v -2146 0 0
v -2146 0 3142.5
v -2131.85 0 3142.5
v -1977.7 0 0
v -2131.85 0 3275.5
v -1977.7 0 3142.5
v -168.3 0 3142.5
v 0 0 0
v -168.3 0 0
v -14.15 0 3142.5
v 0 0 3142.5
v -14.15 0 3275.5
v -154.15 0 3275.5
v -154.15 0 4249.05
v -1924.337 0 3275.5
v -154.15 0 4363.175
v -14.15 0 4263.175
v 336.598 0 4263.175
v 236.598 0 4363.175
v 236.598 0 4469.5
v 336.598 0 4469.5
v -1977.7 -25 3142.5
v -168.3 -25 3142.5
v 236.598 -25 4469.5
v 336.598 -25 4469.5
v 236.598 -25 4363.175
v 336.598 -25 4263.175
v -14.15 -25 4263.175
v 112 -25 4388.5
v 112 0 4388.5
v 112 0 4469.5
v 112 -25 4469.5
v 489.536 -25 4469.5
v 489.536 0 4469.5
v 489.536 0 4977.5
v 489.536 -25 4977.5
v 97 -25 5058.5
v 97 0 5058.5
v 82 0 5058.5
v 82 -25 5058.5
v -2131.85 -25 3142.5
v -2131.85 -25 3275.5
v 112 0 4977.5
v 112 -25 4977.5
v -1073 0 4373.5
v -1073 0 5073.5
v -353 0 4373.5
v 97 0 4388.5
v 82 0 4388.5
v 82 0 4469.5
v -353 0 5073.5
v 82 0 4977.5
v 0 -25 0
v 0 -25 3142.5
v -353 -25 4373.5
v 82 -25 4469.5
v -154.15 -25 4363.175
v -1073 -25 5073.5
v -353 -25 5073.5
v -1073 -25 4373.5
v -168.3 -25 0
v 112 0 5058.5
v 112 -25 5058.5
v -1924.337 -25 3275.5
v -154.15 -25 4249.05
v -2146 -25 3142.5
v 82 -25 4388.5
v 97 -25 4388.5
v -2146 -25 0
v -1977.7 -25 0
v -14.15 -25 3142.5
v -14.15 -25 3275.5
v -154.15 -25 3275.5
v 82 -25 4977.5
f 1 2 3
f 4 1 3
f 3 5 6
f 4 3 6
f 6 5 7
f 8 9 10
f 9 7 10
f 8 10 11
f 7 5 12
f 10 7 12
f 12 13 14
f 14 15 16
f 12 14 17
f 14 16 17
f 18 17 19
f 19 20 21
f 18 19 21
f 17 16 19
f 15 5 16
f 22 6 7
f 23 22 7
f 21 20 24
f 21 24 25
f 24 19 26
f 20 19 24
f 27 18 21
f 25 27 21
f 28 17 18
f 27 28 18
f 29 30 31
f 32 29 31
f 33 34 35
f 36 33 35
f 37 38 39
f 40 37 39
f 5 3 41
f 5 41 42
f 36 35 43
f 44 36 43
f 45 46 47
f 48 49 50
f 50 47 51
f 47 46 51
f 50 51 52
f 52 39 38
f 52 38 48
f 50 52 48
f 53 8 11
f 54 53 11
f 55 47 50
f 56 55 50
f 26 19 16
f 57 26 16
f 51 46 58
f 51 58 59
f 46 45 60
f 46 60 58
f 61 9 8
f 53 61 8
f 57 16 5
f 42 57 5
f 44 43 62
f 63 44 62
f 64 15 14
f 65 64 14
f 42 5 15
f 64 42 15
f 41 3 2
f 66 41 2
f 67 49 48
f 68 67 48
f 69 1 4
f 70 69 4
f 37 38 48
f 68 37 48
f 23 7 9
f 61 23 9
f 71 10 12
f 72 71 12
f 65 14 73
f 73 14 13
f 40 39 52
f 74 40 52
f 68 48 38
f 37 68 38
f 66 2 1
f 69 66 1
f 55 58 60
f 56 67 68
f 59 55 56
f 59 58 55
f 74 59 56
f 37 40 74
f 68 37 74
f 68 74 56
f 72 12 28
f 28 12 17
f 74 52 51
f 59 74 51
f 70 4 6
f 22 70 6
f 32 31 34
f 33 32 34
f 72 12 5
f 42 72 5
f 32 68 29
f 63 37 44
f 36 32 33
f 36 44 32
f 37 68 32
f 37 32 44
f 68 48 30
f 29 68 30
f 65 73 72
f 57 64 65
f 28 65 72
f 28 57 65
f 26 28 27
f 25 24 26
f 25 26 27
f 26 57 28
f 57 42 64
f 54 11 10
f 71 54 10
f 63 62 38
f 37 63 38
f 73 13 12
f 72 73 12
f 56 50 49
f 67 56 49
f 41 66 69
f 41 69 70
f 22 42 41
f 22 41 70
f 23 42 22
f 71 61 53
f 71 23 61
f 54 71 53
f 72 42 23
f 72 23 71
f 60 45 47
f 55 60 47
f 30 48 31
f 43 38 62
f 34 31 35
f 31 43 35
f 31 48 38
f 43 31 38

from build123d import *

# Parameters (mm, degrees)
F0_W     = 140
F0_H     = 133
F1_DEPTH = 25
F0_W_2   = 100
F0_H_2   = 106.324512
F2_DEPTH = 25
F0_W_3   = 720
F0_H_3   = 700
F3_DEPTH = 25
F4_DEPTH = 25


with BuildPart() as f1:
    # F0 (on Front) → F1 (new body)
    with BuildSketch(Plane.XZ):
        Polygon((-168.3, 0), (0, 0), (0, 3142.5), (-14.15, 3142.5), (-154.15, 3142.5), (-168.3, 3142.5), align=None)
        Polygon((-1977.7, 0), (-1977.7, 3142.5), (-1991.85, 3142.5), (-2131.85, 3142.5), (-2146, 3142.5), (-2146, 0), align=None)
        with Locations((-2061.85, 3209)):
            Rectangle(F0_W, F0_H)
        Polygon((-1977.7, 3142.5), (-168.3, 3142.5), (-154.15, 3142.5), (-154.15, 3275.5), (-1924.337425, 3275.5), (-1991.85, 3275.5), (-1991.85, 3142.5), align=None)
        with Locations((-84.15, 3209)):
            Rectangle(F0_W, F0_H)
    extrude(amount=F1_DEPTH)


with BuildPart() as f2:
    # F0 (on Front) → F2 (new body)
    with BuildSketch(Plane.XZ):
        Polygon((-154.15, 3275.5), (-14.15, 3275.5), (-14.15, 4263.175488), (-154.15, 4263.175488), (-154.15, 4249.049816), align=None)
        Polygon((-1991.85, 3275.5), (-1924.337425, 3275.5), (-154.15, 4249.049816), (-154.15, 4263.175488), (-154.15, 4363.175488), (-2131.85, 3275.5), align=None)
        Polygon((-154.15, 4263.175488), (-14.15, 4263.175488), (336.598253, 4263.175488), (336.598253, 4363.175488), (236.598253, 4363.175488), (-154.15, 4363.175488), align=None)
        with Locations((286.598253, 4416.337744)):
            Rectangle(F0_W_2, F0_H_2)
    extrude(amount=F2_DEPTH)


with BuildPart() as f3:
    # F0 (on Front) → F3 (new body)
    with BuildSketch(Plane.XZ):
        with Locations((-713, 4723.5)):
            Rectangle(F0_W_3, F0_H_3)
        Polygon((-353, 4373.5), (82, 4469.5), (82, 4977.5), (-353, 5073.5), align=None)
        Polygon((82, 4388.5), (97, 4388.5), (97, 5058.5), (82, 5058.5), (82, 4977.5), (82, 4469.5), align=None)
    extrude(amount=F3_DEPTH)


with BuildPart() as f4:
    # F0 (on Front) → F4 (new body)
    with BuildSketch(Plane.XZ):
        Polygon((112, 4388.5), (112, 4469.5), (112, 4977.5), (112, 5058.5), (97, 5058.5), (97, 4388.5), align=None)
        Polygon((236.598253, 4469.5), (336.598253, 4469.5), (489.53629, 4469.5), (489.53629, 4977.5), (112, 4977.5), (112, 4469.5), align=None)
    extrude(amount=F4_DEPTH)


solid = Compound([f1.part, f2.part, f3.part, f4.part])
